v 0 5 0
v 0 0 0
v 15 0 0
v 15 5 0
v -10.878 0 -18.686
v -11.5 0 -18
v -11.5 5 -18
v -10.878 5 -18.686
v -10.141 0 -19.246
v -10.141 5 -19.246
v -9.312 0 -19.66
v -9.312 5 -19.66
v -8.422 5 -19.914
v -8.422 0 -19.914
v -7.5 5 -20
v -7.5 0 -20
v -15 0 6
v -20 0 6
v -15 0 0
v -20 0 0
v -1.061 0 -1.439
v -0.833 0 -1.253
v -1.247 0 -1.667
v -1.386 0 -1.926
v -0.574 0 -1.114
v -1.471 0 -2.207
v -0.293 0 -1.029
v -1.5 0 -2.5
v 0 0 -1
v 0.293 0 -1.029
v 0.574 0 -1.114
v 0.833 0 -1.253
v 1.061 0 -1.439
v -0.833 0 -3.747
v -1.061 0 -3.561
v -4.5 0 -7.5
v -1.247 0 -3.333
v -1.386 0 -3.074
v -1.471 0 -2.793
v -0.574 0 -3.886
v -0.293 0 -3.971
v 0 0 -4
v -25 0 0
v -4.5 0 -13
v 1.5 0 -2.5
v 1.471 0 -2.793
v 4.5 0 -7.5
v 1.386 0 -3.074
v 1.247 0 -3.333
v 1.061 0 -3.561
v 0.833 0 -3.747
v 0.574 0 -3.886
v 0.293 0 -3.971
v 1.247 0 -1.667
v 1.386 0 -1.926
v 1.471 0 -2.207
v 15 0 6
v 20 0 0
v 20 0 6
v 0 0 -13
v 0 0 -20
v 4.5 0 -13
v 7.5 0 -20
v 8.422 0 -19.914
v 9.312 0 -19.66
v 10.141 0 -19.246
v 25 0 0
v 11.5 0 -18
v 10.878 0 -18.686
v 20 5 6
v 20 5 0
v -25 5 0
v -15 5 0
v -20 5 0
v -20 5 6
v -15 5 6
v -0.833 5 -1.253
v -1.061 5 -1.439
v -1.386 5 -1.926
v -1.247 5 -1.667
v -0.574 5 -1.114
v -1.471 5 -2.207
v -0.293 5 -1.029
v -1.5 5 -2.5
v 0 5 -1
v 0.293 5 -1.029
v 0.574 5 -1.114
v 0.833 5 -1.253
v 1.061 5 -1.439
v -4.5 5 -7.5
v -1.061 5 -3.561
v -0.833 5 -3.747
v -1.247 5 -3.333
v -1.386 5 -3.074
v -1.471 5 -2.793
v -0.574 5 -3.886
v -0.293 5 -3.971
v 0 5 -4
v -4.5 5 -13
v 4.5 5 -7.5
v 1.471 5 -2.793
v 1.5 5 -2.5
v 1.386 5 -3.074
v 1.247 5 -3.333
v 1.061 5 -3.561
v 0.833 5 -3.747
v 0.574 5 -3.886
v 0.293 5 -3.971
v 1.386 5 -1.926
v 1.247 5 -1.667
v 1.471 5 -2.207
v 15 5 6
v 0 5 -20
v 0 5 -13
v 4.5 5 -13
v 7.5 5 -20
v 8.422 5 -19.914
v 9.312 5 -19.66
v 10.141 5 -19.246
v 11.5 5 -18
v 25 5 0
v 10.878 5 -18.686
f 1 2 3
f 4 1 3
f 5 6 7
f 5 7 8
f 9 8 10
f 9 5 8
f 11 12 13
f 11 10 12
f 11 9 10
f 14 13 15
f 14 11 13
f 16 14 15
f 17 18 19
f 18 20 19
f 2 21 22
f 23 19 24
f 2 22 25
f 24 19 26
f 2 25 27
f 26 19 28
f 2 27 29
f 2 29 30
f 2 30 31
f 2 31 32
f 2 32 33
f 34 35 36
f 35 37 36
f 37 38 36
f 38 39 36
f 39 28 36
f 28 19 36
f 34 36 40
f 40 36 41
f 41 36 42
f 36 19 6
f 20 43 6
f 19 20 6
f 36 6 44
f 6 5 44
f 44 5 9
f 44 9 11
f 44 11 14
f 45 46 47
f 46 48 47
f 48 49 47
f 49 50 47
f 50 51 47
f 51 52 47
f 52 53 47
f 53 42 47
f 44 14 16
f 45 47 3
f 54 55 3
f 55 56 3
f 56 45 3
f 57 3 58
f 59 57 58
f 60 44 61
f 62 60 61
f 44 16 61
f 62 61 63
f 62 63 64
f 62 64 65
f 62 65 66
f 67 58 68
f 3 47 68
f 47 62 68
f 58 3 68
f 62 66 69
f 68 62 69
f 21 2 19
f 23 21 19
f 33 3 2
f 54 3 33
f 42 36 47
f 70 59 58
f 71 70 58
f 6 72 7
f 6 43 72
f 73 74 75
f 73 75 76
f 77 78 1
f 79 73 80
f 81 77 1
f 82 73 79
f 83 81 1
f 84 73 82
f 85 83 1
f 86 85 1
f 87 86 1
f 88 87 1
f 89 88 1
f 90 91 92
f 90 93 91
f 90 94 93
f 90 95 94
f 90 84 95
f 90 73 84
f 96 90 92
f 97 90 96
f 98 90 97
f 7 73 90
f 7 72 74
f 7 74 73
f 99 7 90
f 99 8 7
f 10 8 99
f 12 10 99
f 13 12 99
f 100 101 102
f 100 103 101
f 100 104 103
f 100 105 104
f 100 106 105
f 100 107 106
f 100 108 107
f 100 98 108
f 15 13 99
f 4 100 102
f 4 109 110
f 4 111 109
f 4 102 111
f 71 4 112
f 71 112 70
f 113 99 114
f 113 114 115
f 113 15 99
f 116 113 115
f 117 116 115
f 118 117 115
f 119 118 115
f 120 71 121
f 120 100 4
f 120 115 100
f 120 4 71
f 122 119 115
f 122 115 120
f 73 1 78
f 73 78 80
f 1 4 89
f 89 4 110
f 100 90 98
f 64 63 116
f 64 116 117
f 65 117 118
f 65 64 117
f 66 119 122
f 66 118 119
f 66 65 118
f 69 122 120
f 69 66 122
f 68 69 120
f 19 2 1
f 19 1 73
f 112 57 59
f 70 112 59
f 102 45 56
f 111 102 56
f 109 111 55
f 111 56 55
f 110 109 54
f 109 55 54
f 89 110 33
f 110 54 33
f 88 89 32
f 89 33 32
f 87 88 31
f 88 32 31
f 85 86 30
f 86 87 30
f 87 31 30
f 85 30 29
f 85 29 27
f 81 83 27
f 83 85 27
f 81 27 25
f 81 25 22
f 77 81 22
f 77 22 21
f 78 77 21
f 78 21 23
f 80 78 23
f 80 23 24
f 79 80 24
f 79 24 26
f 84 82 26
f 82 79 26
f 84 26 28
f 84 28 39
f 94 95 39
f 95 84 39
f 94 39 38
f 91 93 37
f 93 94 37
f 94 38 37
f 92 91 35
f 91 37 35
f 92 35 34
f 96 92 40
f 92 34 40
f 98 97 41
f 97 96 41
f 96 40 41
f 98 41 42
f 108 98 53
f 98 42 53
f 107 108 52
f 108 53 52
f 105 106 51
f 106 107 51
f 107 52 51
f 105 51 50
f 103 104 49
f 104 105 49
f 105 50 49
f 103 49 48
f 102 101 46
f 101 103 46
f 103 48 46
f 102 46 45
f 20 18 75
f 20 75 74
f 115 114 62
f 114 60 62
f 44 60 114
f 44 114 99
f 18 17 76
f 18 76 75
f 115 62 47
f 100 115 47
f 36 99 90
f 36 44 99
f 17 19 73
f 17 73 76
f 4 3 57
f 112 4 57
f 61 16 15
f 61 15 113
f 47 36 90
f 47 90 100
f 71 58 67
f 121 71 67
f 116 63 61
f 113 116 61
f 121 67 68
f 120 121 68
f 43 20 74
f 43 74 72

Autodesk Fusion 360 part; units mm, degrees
sketch "Sketch1" plane through (0, 0, 0) normal (0, 1, 0) x (1, 0, 0)
  line L0 (0, 0) -> (-15, 0)
  line L1 (-15, 0) -> (-15, -6)
  line L2 (-15, -6) -> (-20, -6)
  line L3 (-20, -6) -> (-20, 0)
  line L4 (-20, 0) -> (-25, 0)
  line L5 (-7.5, 20) -> (0, 20)
  line L6 (0, 0) -> (15, 0)
  line L7 (15, 0) -> (15, -6)
  line L8 (15, -6) -> (20, -6)
  line L9 (20, -6) -> (20, 0)
  line L10 (20, 0) -> (25, 0)
  line L11 (7.5, 20) -> (0, 20)
  line L12 (-25, 0) -> (-11.5, 18)
  line L13 (25, 0) -> (11.5, 18)
  arc A0 (-7.5, 20) -> (-11.5, 18) centre (-7.5, 15) ccw
  arc A1 (11.5, 18) -> (7.5, 20) centre (7.5, 15) ccw
  line L14 (0, 13) -> (-4.5, 13)
  line L15 (-4.5, 13) -> (-4.5, 7.5)
  line L16 (-4.5, 7.5) -> (4.5, 7.5)
  line L17 (0, 13) -> (4.5, 13)
  line L18 (4.5, 13) -> (4.5, 7.5)
  circle A2 centre (0, 2.5) radius 1.5
  dimension "d1" = 5
  dimension "d6" = 2.5
  dimension "d7" = 3
extrude "Extrude1" add sketch "Sketch1" along normal blind 5
